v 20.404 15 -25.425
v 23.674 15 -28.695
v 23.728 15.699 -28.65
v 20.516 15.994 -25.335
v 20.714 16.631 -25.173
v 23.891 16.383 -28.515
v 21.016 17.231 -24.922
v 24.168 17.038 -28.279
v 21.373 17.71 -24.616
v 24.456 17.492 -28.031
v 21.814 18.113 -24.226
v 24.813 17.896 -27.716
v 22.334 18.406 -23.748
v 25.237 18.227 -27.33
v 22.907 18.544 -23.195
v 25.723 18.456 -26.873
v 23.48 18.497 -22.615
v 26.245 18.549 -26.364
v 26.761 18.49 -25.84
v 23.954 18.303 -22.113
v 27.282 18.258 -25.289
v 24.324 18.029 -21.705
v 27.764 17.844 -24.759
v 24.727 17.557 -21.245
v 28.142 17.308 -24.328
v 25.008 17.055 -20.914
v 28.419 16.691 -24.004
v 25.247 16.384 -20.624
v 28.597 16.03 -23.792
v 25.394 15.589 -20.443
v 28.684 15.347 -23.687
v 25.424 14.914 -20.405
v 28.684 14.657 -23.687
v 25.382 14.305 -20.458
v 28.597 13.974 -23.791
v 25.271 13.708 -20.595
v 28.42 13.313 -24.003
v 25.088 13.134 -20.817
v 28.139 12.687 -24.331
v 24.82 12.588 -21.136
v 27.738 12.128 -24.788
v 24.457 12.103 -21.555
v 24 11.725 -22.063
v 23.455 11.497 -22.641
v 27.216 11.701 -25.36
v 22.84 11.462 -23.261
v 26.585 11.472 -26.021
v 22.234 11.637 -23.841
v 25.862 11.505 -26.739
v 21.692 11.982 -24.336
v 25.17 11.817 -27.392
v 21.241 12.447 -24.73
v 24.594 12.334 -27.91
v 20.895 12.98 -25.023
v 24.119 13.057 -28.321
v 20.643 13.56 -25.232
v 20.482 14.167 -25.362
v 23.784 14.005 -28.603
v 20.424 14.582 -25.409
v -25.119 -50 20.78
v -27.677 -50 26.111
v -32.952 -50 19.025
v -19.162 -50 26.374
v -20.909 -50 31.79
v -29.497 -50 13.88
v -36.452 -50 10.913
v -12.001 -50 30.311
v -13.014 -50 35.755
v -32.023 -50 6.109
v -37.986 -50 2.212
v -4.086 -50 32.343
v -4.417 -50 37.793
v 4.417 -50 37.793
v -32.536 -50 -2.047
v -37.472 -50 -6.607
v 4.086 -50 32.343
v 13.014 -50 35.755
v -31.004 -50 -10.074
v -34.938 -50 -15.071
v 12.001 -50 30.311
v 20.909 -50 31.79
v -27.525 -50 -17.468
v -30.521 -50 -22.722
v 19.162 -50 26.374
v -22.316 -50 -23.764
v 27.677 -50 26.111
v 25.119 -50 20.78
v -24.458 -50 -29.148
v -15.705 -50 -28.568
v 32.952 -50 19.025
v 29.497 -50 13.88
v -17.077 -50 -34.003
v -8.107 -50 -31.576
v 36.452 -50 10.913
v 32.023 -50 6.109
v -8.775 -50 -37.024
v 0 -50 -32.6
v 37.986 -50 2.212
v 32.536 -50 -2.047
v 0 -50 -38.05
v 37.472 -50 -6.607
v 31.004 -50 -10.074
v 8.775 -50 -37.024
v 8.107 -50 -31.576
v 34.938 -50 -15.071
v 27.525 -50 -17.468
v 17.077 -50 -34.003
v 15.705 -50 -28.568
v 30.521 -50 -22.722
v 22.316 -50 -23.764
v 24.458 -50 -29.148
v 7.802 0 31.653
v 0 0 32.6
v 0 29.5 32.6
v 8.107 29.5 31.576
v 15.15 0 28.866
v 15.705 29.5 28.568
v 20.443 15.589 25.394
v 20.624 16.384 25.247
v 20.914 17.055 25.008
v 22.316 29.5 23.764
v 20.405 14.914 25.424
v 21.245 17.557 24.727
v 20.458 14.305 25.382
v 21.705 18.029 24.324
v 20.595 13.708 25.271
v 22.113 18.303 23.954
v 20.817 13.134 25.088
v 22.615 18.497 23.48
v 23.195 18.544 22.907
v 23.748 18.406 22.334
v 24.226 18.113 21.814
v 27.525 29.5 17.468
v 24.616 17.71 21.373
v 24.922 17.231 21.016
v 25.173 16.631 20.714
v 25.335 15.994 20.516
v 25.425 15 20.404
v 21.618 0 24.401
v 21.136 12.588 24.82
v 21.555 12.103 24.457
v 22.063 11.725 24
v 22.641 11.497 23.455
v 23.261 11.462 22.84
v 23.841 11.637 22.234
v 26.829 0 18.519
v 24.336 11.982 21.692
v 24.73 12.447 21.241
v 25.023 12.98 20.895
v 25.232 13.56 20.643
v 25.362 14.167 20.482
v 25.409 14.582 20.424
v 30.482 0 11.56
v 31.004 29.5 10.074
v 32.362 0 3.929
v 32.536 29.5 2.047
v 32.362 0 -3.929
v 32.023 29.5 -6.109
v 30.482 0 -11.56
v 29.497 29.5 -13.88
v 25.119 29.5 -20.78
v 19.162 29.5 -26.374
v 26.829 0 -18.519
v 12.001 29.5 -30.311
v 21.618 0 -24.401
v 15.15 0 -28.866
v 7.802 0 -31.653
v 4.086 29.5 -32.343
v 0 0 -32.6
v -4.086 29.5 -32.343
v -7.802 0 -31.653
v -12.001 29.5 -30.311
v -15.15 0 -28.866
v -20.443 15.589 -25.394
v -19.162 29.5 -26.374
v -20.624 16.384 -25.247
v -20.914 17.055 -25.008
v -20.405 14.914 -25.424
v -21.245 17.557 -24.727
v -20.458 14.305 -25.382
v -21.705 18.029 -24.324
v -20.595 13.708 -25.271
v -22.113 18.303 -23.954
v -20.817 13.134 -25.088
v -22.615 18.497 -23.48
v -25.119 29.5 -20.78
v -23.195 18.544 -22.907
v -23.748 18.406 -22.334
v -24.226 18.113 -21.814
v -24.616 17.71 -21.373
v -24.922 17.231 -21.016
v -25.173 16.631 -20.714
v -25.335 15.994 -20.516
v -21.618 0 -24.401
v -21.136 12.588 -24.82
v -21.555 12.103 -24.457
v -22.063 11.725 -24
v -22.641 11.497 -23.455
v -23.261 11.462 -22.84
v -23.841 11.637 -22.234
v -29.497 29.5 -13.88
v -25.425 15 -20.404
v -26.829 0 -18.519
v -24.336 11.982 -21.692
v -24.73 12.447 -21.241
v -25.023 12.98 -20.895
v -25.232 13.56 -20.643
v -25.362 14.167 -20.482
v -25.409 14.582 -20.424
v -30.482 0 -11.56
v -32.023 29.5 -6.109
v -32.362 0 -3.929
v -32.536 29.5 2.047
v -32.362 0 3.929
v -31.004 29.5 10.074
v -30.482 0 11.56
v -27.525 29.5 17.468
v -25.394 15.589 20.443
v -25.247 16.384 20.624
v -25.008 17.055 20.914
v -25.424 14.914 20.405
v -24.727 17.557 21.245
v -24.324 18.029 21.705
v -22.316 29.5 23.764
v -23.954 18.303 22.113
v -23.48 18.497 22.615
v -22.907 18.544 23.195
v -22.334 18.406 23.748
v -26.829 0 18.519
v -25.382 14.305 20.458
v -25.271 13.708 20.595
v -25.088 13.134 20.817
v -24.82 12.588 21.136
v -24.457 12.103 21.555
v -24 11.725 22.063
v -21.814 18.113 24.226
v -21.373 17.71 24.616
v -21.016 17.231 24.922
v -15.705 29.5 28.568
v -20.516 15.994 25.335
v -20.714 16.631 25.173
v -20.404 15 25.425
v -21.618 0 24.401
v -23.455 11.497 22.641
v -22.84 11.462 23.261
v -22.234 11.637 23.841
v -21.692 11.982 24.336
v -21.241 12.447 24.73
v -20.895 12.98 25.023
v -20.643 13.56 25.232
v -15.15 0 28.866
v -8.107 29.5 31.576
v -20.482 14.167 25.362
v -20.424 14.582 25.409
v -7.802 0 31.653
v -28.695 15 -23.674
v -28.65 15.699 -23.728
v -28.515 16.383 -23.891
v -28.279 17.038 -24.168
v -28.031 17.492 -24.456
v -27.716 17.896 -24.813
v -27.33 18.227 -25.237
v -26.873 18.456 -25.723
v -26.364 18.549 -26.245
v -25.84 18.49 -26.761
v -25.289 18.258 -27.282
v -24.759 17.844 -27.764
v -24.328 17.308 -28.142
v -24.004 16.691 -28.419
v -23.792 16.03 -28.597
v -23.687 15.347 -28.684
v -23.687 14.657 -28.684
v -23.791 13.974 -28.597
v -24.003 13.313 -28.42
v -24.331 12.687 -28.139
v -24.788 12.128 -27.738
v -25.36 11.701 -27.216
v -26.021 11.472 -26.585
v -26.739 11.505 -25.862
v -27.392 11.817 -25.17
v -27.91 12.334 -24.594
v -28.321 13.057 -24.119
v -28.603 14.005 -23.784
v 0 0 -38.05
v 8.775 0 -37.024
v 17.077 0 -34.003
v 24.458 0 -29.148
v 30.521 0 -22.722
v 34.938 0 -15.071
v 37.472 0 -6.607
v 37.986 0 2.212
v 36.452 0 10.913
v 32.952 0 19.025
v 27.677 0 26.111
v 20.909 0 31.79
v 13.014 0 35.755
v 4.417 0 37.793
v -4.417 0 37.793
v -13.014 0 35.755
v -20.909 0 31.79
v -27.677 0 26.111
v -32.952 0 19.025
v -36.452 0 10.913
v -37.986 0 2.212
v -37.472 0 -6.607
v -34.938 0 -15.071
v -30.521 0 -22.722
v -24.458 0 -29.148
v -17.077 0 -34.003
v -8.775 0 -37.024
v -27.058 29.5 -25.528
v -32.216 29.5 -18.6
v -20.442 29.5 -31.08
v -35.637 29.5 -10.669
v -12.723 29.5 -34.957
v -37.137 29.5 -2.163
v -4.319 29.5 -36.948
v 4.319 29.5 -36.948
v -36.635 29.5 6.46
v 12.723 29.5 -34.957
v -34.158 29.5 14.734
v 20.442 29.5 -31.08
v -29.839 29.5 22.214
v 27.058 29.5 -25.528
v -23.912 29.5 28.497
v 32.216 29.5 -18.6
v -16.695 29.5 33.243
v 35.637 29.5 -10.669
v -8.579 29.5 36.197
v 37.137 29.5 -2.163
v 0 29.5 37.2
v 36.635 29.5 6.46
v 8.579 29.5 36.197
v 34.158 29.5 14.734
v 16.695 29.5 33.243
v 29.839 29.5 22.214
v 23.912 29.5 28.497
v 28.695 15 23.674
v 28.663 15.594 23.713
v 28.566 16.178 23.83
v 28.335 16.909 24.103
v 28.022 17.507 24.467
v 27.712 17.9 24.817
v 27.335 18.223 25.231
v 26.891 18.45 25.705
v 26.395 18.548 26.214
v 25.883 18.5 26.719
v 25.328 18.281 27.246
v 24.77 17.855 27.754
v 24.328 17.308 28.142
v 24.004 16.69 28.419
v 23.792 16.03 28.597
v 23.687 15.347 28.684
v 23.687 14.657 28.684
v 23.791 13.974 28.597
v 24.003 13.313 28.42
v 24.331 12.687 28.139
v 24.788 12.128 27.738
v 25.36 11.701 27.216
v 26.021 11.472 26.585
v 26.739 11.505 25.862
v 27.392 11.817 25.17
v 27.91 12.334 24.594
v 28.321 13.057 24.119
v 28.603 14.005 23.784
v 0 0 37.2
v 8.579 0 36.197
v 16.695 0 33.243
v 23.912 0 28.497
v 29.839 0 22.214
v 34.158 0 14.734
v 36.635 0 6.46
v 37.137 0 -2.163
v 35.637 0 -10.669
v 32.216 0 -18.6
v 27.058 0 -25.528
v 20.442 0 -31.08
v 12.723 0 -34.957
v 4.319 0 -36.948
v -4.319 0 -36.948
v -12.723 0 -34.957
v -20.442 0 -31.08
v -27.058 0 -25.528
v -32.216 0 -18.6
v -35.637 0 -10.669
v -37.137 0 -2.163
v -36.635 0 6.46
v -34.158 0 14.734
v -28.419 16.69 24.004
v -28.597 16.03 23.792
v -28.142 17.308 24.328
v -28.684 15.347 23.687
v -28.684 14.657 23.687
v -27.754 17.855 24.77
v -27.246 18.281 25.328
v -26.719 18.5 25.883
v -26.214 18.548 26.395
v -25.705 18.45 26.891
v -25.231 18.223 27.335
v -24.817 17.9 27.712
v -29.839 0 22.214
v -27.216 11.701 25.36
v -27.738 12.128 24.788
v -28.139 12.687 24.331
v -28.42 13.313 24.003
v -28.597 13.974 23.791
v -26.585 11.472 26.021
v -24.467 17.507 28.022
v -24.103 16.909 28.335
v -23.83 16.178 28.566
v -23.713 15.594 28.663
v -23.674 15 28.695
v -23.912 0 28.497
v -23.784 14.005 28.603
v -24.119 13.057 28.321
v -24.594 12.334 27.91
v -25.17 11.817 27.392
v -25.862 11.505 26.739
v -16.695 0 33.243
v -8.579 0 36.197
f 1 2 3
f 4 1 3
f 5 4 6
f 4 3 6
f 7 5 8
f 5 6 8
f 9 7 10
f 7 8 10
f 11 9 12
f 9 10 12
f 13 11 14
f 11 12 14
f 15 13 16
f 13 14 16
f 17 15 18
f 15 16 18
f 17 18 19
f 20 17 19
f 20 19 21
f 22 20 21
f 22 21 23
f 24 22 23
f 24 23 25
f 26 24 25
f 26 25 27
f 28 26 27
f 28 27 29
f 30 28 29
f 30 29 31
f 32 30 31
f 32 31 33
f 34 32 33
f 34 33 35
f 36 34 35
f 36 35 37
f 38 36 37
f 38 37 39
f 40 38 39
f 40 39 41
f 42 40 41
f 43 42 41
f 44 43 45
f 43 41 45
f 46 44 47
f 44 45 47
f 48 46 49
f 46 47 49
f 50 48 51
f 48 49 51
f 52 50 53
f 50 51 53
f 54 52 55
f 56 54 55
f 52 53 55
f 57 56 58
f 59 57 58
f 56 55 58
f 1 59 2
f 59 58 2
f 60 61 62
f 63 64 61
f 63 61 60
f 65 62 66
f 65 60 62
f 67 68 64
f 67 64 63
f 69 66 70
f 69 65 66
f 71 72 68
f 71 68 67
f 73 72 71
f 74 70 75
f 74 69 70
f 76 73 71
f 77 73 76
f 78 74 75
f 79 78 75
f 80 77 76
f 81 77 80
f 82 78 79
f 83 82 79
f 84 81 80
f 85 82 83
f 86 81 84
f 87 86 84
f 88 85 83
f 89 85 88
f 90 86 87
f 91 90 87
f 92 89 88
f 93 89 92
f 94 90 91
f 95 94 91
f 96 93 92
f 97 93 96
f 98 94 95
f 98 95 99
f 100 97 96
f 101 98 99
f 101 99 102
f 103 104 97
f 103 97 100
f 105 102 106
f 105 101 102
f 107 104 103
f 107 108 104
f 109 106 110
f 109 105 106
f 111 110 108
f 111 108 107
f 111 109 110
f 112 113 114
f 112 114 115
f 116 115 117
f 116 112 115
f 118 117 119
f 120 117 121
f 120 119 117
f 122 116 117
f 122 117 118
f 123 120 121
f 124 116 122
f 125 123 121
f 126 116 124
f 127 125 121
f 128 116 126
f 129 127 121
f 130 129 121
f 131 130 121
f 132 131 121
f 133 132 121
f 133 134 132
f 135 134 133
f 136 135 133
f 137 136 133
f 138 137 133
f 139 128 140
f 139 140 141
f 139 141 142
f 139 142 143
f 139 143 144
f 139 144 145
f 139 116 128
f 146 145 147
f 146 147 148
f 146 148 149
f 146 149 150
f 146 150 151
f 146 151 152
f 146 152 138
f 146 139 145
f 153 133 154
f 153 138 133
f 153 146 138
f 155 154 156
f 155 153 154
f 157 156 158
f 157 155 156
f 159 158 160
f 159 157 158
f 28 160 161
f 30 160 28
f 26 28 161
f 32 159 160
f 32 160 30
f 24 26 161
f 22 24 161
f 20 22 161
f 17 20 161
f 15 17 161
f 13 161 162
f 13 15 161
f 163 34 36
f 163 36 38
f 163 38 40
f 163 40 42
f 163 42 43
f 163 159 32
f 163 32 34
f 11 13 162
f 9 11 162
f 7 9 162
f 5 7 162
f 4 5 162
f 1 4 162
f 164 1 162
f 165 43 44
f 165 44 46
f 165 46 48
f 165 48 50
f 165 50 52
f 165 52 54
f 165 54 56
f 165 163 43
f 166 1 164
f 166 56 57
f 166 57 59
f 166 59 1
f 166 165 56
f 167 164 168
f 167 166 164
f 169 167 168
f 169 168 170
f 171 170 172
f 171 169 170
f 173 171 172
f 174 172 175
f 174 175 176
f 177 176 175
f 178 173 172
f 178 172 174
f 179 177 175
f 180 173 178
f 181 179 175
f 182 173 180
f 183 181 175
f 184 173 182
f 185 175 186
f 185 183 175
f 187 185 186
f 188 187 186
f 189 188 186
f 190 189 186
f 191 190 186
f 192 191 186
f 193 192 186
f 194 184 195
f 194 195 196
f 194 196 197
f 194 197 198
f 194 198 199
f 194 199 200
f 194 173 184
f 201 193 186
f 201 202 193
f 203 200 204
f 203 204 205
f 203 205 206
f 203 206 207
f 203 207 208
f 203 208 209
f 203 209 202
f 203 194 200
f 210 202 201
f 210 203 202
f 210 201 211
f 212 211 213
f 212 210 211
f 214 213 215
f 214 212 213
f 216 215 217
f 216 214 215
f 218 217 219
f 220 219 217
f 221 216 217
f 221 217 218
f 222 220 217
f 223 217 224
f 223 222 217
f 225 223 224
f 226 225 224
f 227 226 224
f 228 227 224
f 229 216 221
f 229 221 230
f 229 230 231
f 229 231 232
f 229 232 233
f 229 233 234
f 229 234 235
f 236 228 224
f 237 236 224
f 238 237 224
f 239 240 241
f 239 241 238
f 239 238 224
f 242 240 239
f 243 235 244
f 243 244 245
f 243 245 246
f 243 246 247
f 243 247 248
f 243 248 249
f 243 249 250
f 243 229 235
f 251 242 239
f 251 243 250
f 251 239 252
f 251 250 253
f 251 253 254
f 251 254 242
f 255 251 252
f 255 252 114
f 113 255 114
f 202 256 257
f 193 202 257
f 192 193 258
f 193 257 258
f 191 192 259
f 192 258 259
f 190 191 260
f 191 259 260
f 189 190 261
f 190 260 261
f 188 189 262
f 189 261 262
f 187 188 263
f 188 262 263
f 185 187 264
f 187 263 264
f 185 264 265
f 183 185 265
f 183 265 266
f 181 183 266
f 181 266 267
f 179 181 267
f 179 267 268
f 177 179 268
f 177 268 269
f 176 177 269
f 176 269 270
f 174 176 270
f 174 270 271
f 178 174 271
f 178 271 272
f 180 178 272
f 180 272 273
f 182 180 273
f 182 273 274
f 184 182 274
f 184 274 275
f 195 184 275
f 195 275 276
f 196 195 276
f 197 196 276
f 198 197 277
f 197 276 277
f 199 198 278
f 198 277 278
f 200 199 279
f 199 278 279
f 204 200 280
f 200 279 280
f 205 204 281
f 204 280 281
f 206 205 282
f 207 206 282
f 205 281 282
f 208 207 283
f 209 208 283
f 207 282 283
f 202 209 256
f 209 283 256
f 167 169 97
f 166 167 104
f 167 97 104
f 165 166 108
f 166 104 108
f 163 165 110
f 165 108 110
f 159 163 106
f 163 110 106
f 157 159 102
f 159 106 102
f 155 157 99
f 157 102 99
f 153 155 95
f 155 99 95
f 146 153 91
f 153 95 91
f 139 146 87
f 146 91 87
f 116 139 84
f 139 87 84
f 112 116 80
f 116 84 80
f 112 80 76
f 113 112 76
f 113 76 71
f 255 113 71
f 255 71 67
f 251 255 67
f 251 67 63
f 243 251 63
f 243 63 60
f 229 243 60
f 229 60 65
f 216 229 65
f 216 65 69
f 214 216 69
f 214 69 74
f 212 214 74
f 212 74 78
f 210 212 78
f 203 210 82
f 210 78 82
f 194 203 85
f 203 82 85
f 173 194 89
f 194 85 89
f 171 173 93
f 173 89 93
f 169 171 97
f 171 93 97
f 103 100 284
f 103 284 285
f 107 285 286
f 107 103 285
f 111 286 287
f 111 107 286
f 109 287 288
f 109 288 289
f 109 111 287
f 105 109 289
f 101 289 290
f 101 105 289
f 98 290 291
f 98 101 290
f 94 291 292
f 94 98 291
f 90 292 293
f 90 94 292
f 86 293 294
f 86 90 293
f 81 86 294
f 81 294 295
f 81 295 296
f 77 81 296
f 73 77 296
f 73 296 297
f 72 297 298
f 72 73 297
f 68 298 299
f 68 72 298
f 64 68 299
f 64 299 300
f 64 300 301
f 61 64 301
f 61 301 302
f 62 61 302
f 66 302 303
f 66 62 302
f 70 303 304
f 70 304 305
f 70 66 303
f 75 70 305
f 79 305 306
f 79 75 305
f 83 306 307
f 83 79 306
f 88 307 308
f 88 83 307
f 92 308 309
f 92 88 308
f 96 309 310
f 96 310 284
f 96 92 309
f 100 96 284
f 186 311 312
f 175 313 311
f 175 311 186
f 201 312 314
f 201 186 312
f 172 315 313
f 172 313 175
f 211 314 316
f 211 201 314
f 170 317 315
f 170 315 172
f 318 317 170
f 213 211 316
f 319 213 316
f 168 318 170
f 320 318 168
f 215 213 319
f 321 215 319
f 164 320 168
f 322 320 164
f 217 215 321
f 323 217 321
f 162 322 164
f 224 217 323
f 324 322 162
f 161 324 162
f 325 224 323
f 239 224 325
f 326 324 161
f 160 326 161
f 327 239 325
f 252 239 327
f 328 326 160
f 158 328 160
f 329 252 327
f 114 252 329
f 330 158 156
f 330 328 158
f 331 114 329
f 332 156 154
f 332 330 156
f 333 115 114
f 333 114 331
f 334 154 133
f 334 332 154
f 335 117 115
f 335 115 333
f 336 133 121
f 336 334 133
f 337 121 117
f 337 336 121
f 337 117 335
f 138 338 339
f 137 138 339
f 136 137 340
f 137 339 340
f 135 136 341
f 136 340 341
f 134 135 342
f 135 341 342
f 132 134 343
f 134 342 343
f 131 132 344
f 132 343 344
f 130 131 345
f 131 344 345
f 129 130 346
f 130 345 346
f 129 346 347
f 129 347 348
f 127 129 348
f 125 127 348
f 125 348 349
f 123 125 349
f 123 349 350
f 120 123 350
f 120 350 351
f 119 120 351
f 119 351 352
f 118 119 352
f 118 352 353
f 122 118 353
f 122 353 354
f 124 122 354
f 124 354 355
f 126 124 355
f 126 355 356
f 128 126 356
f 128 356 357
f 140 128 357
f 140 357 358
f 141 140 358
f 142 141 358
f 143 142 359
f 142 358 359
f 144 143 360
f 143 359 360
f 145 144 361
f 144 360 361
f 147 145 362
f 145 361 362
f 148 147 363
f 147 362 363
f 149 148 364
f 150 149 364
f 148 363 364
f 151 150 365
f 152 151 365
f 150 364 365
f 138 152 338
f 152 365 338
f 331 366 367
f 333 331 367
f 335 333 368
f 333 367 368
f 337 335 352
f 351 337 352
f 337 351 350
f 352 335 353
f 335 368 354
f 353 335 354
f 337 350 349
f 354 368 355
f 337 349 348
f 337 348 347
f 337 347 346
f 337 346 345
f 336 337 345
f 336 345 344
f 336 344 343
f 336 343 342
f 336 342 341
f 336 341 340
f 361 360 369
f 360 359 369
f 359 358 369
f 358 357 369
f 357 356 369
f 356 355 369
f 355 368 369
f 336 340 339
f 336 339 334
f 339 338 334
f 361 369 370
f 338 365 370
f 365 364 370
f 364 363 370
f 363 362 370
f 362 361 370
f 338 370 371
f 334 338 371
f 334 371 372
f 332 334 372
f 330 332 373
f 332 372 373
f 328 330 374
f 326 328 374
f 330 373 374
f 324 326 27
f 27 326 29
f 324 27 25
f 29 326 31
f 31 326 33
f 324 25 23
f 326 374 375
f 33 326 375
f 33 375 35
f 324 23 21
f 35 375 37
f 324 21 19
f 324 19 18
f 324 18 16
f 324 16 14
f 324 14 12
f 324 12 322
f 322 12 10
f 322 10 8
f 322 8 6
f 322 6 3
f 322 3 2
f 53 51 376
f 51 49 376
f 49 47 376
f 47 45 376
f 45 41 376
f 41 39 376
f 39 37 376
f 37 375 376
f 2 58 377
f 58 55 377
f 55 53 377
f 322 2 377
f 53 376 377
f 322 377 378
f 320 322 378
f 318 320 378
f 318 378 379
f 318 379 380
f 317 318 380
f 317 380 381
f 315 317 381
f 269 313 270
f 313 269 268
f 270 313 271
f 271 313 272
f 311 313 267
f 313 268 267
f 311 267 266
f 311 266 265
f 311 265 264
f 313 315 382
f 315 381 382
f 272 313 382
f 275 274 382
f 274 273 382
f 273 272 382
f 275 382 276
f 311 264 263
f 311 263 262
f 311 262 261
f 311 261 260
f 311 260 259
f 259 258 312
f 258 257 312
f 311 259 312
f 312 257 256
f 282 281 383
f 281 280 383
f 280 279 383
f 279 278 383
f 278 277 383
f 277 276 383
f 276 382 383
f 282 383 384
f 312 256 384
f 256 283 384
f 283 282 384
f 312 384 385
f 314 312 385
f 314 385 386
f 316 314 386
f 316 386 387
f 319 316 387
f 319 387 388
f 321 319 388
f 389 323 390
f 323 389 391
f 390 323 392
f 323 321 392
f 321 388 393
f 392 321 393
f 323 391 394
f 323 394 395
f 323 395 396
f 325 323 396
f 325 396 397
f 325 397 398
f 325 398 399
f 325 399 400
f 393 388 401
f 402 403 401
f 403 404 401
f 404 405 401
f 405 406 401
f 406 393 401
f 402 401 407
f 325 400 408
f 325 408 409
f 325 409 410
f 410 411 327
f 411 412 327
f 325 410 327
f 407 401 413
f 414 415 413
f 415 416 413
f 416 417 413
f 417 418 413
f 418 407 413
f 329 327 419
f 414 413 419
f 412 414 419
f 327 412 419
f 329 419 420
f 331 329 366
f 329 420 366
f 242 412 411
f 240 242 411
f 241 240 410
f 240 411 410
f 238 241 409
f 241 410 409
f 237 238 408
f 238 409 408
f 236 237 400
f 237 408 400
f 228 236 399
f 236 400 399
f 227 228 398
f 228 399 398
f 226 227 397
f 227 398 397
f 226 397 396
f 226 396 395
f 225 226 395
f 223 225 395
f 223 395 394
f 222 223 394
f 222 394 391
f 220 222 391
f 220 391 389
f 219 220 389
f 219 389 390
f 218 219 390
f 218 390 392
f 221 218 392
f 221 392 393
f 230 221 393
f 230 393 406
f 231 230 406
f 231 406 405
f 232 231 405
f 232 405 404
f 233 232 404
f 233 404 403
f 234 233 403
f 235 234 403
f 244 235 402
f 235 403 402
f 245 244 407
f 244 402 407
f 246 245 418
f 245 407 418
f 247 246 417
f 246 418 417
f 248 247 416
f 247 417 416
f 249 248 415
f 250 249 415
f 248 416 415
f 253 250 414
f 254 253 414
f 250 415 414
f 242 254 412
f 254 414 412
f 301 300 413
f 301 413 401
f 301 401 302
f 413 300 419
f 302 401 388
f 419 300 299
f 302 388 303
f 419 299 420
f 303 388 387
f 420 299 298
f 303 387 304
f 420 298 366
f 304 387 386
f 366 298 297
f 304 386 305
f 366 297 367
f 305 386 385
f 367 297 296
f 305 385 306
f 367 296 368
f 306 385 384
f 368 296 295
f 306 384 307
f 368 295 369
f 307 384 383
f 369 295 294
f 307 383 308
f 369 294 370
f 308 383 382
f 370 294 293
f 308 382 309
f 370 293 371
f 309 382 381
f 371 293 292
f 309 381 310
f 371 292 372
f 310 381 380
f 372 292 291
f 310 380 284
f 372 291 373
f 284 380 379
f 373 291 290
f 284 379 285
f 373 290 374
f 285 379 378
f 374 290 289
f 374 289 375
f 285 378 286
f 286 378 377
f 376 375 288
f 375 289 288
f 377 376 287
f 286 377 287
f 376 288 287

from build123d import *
from build123d.topology import SkipClean

# Parameters (mm, degrees)
SKETCH1_R               = 37.2
SKETCH1_R_2             = 32.6
BOSS_EXTRUDE1_DEPTH     = 29.5
CUT_EXTRUDE1_REACH      = 96.53
CUT_EXTRUDE1_END_RADIUS = 32.6
SKETCH2_R               = 3.55
CIRPATTERN1_COUNT       = 4
BOSS_EXTRUDE2_START     = 50
SKETCH3_R               = 38.05
SKETCH3_R_2             = 32.6
BOSS_EXTRUDE2_DEPTH     = 50


with BuildPart() as part:
    # Sketch1 → Boss-Extrude1 (new body)
    with BuildSketch(Plane(origin=(0, 0, 0), x_dir=(1, 0, 0), z_dir=(0, 1, 0))):
        with Locations(Location((0, 0, 0), (0, 0, 270))):
            Circle(SKETCH1_R)
        with Locations(Location((0, 0, 0), (0, 0, 270))):
            Circle(SKETCH1_R_2, mode=Mode.SUBTRACT)
    extrude(amount=BOSS_EXTRUDE1_DEPTH)

    # Cut-Extrude1: up to this cylinder (the profile starts outside it)
    cut_extrude1_end = Plane(origin=(0, 15, 0), z_dir=(0, -1, 0)) * Cylinder(CUT_EXTRUDE1_END_RADIUS, 259.26, mode=Mode.PRIVATE)
    # Sketch2 → Cut-Extrude1 (cut, up to the surface)
    with BuildSketch(Plane(origin=(-26.30437226, 0, -26.30437226), x_dir=(0, -1, 0), z_dir=(-0.7071067811865464, 0, -0.7071067811865488)), mode=Mode.PRIVATE) as cut_extrude1_sk1:
        with Locations(Location((-15, 0, 0), (0, 0, 90))):
            Circle(SKETCH2_R)
    cut_extrude1_tool1 = extrude(cut_extrude1_sk1.sketch, amount=-CUT_EXTRUDE1_REACH, mode=Mode.PRIVATE) - cut_extrude1_end
    cut_extrude1 = cut_extrude1_tool1.solids().sort_by_distance((-26.304372, 15, -26.304372))[0]
    add(cut_extrude1, mode=Mode.SUBTRACT)

    # CirPattern1: Cut-Extrude1 ×4 about axis
    cirpattern1_axis = Axis((0, 29.5, 0), (0, -1, 0))
    for i in range(1, CIRPATTERN1_COUNT):
        add(cut_extrude1.rotate(cirpattern1_axis, i * 360 / CIRPATTERN1_COUNT), mode=Mode.SUBTRACT)

    # Sketch3 → Boss-Extrude2 (add)
    with SkipClean():  # the faces are left unmerged after this step: merging them gives an invalid solid
        with BuildSketch(Plane.XZ.offset(BOSS_EXTRUDE2_START)):
            with Locations(Location((0, 0, 0), (0, 0, 270))):
                Circle(SKETCH3_R)
            with Locations(Location((0, 0, 0), (0, 0, 270))):
                Circle(SKETCH3_R_2, mode=Mode.SUBTRACT)
        extrude(amount=-BOSS_EXTRUDE2_DEPTH)


solid = part.part
